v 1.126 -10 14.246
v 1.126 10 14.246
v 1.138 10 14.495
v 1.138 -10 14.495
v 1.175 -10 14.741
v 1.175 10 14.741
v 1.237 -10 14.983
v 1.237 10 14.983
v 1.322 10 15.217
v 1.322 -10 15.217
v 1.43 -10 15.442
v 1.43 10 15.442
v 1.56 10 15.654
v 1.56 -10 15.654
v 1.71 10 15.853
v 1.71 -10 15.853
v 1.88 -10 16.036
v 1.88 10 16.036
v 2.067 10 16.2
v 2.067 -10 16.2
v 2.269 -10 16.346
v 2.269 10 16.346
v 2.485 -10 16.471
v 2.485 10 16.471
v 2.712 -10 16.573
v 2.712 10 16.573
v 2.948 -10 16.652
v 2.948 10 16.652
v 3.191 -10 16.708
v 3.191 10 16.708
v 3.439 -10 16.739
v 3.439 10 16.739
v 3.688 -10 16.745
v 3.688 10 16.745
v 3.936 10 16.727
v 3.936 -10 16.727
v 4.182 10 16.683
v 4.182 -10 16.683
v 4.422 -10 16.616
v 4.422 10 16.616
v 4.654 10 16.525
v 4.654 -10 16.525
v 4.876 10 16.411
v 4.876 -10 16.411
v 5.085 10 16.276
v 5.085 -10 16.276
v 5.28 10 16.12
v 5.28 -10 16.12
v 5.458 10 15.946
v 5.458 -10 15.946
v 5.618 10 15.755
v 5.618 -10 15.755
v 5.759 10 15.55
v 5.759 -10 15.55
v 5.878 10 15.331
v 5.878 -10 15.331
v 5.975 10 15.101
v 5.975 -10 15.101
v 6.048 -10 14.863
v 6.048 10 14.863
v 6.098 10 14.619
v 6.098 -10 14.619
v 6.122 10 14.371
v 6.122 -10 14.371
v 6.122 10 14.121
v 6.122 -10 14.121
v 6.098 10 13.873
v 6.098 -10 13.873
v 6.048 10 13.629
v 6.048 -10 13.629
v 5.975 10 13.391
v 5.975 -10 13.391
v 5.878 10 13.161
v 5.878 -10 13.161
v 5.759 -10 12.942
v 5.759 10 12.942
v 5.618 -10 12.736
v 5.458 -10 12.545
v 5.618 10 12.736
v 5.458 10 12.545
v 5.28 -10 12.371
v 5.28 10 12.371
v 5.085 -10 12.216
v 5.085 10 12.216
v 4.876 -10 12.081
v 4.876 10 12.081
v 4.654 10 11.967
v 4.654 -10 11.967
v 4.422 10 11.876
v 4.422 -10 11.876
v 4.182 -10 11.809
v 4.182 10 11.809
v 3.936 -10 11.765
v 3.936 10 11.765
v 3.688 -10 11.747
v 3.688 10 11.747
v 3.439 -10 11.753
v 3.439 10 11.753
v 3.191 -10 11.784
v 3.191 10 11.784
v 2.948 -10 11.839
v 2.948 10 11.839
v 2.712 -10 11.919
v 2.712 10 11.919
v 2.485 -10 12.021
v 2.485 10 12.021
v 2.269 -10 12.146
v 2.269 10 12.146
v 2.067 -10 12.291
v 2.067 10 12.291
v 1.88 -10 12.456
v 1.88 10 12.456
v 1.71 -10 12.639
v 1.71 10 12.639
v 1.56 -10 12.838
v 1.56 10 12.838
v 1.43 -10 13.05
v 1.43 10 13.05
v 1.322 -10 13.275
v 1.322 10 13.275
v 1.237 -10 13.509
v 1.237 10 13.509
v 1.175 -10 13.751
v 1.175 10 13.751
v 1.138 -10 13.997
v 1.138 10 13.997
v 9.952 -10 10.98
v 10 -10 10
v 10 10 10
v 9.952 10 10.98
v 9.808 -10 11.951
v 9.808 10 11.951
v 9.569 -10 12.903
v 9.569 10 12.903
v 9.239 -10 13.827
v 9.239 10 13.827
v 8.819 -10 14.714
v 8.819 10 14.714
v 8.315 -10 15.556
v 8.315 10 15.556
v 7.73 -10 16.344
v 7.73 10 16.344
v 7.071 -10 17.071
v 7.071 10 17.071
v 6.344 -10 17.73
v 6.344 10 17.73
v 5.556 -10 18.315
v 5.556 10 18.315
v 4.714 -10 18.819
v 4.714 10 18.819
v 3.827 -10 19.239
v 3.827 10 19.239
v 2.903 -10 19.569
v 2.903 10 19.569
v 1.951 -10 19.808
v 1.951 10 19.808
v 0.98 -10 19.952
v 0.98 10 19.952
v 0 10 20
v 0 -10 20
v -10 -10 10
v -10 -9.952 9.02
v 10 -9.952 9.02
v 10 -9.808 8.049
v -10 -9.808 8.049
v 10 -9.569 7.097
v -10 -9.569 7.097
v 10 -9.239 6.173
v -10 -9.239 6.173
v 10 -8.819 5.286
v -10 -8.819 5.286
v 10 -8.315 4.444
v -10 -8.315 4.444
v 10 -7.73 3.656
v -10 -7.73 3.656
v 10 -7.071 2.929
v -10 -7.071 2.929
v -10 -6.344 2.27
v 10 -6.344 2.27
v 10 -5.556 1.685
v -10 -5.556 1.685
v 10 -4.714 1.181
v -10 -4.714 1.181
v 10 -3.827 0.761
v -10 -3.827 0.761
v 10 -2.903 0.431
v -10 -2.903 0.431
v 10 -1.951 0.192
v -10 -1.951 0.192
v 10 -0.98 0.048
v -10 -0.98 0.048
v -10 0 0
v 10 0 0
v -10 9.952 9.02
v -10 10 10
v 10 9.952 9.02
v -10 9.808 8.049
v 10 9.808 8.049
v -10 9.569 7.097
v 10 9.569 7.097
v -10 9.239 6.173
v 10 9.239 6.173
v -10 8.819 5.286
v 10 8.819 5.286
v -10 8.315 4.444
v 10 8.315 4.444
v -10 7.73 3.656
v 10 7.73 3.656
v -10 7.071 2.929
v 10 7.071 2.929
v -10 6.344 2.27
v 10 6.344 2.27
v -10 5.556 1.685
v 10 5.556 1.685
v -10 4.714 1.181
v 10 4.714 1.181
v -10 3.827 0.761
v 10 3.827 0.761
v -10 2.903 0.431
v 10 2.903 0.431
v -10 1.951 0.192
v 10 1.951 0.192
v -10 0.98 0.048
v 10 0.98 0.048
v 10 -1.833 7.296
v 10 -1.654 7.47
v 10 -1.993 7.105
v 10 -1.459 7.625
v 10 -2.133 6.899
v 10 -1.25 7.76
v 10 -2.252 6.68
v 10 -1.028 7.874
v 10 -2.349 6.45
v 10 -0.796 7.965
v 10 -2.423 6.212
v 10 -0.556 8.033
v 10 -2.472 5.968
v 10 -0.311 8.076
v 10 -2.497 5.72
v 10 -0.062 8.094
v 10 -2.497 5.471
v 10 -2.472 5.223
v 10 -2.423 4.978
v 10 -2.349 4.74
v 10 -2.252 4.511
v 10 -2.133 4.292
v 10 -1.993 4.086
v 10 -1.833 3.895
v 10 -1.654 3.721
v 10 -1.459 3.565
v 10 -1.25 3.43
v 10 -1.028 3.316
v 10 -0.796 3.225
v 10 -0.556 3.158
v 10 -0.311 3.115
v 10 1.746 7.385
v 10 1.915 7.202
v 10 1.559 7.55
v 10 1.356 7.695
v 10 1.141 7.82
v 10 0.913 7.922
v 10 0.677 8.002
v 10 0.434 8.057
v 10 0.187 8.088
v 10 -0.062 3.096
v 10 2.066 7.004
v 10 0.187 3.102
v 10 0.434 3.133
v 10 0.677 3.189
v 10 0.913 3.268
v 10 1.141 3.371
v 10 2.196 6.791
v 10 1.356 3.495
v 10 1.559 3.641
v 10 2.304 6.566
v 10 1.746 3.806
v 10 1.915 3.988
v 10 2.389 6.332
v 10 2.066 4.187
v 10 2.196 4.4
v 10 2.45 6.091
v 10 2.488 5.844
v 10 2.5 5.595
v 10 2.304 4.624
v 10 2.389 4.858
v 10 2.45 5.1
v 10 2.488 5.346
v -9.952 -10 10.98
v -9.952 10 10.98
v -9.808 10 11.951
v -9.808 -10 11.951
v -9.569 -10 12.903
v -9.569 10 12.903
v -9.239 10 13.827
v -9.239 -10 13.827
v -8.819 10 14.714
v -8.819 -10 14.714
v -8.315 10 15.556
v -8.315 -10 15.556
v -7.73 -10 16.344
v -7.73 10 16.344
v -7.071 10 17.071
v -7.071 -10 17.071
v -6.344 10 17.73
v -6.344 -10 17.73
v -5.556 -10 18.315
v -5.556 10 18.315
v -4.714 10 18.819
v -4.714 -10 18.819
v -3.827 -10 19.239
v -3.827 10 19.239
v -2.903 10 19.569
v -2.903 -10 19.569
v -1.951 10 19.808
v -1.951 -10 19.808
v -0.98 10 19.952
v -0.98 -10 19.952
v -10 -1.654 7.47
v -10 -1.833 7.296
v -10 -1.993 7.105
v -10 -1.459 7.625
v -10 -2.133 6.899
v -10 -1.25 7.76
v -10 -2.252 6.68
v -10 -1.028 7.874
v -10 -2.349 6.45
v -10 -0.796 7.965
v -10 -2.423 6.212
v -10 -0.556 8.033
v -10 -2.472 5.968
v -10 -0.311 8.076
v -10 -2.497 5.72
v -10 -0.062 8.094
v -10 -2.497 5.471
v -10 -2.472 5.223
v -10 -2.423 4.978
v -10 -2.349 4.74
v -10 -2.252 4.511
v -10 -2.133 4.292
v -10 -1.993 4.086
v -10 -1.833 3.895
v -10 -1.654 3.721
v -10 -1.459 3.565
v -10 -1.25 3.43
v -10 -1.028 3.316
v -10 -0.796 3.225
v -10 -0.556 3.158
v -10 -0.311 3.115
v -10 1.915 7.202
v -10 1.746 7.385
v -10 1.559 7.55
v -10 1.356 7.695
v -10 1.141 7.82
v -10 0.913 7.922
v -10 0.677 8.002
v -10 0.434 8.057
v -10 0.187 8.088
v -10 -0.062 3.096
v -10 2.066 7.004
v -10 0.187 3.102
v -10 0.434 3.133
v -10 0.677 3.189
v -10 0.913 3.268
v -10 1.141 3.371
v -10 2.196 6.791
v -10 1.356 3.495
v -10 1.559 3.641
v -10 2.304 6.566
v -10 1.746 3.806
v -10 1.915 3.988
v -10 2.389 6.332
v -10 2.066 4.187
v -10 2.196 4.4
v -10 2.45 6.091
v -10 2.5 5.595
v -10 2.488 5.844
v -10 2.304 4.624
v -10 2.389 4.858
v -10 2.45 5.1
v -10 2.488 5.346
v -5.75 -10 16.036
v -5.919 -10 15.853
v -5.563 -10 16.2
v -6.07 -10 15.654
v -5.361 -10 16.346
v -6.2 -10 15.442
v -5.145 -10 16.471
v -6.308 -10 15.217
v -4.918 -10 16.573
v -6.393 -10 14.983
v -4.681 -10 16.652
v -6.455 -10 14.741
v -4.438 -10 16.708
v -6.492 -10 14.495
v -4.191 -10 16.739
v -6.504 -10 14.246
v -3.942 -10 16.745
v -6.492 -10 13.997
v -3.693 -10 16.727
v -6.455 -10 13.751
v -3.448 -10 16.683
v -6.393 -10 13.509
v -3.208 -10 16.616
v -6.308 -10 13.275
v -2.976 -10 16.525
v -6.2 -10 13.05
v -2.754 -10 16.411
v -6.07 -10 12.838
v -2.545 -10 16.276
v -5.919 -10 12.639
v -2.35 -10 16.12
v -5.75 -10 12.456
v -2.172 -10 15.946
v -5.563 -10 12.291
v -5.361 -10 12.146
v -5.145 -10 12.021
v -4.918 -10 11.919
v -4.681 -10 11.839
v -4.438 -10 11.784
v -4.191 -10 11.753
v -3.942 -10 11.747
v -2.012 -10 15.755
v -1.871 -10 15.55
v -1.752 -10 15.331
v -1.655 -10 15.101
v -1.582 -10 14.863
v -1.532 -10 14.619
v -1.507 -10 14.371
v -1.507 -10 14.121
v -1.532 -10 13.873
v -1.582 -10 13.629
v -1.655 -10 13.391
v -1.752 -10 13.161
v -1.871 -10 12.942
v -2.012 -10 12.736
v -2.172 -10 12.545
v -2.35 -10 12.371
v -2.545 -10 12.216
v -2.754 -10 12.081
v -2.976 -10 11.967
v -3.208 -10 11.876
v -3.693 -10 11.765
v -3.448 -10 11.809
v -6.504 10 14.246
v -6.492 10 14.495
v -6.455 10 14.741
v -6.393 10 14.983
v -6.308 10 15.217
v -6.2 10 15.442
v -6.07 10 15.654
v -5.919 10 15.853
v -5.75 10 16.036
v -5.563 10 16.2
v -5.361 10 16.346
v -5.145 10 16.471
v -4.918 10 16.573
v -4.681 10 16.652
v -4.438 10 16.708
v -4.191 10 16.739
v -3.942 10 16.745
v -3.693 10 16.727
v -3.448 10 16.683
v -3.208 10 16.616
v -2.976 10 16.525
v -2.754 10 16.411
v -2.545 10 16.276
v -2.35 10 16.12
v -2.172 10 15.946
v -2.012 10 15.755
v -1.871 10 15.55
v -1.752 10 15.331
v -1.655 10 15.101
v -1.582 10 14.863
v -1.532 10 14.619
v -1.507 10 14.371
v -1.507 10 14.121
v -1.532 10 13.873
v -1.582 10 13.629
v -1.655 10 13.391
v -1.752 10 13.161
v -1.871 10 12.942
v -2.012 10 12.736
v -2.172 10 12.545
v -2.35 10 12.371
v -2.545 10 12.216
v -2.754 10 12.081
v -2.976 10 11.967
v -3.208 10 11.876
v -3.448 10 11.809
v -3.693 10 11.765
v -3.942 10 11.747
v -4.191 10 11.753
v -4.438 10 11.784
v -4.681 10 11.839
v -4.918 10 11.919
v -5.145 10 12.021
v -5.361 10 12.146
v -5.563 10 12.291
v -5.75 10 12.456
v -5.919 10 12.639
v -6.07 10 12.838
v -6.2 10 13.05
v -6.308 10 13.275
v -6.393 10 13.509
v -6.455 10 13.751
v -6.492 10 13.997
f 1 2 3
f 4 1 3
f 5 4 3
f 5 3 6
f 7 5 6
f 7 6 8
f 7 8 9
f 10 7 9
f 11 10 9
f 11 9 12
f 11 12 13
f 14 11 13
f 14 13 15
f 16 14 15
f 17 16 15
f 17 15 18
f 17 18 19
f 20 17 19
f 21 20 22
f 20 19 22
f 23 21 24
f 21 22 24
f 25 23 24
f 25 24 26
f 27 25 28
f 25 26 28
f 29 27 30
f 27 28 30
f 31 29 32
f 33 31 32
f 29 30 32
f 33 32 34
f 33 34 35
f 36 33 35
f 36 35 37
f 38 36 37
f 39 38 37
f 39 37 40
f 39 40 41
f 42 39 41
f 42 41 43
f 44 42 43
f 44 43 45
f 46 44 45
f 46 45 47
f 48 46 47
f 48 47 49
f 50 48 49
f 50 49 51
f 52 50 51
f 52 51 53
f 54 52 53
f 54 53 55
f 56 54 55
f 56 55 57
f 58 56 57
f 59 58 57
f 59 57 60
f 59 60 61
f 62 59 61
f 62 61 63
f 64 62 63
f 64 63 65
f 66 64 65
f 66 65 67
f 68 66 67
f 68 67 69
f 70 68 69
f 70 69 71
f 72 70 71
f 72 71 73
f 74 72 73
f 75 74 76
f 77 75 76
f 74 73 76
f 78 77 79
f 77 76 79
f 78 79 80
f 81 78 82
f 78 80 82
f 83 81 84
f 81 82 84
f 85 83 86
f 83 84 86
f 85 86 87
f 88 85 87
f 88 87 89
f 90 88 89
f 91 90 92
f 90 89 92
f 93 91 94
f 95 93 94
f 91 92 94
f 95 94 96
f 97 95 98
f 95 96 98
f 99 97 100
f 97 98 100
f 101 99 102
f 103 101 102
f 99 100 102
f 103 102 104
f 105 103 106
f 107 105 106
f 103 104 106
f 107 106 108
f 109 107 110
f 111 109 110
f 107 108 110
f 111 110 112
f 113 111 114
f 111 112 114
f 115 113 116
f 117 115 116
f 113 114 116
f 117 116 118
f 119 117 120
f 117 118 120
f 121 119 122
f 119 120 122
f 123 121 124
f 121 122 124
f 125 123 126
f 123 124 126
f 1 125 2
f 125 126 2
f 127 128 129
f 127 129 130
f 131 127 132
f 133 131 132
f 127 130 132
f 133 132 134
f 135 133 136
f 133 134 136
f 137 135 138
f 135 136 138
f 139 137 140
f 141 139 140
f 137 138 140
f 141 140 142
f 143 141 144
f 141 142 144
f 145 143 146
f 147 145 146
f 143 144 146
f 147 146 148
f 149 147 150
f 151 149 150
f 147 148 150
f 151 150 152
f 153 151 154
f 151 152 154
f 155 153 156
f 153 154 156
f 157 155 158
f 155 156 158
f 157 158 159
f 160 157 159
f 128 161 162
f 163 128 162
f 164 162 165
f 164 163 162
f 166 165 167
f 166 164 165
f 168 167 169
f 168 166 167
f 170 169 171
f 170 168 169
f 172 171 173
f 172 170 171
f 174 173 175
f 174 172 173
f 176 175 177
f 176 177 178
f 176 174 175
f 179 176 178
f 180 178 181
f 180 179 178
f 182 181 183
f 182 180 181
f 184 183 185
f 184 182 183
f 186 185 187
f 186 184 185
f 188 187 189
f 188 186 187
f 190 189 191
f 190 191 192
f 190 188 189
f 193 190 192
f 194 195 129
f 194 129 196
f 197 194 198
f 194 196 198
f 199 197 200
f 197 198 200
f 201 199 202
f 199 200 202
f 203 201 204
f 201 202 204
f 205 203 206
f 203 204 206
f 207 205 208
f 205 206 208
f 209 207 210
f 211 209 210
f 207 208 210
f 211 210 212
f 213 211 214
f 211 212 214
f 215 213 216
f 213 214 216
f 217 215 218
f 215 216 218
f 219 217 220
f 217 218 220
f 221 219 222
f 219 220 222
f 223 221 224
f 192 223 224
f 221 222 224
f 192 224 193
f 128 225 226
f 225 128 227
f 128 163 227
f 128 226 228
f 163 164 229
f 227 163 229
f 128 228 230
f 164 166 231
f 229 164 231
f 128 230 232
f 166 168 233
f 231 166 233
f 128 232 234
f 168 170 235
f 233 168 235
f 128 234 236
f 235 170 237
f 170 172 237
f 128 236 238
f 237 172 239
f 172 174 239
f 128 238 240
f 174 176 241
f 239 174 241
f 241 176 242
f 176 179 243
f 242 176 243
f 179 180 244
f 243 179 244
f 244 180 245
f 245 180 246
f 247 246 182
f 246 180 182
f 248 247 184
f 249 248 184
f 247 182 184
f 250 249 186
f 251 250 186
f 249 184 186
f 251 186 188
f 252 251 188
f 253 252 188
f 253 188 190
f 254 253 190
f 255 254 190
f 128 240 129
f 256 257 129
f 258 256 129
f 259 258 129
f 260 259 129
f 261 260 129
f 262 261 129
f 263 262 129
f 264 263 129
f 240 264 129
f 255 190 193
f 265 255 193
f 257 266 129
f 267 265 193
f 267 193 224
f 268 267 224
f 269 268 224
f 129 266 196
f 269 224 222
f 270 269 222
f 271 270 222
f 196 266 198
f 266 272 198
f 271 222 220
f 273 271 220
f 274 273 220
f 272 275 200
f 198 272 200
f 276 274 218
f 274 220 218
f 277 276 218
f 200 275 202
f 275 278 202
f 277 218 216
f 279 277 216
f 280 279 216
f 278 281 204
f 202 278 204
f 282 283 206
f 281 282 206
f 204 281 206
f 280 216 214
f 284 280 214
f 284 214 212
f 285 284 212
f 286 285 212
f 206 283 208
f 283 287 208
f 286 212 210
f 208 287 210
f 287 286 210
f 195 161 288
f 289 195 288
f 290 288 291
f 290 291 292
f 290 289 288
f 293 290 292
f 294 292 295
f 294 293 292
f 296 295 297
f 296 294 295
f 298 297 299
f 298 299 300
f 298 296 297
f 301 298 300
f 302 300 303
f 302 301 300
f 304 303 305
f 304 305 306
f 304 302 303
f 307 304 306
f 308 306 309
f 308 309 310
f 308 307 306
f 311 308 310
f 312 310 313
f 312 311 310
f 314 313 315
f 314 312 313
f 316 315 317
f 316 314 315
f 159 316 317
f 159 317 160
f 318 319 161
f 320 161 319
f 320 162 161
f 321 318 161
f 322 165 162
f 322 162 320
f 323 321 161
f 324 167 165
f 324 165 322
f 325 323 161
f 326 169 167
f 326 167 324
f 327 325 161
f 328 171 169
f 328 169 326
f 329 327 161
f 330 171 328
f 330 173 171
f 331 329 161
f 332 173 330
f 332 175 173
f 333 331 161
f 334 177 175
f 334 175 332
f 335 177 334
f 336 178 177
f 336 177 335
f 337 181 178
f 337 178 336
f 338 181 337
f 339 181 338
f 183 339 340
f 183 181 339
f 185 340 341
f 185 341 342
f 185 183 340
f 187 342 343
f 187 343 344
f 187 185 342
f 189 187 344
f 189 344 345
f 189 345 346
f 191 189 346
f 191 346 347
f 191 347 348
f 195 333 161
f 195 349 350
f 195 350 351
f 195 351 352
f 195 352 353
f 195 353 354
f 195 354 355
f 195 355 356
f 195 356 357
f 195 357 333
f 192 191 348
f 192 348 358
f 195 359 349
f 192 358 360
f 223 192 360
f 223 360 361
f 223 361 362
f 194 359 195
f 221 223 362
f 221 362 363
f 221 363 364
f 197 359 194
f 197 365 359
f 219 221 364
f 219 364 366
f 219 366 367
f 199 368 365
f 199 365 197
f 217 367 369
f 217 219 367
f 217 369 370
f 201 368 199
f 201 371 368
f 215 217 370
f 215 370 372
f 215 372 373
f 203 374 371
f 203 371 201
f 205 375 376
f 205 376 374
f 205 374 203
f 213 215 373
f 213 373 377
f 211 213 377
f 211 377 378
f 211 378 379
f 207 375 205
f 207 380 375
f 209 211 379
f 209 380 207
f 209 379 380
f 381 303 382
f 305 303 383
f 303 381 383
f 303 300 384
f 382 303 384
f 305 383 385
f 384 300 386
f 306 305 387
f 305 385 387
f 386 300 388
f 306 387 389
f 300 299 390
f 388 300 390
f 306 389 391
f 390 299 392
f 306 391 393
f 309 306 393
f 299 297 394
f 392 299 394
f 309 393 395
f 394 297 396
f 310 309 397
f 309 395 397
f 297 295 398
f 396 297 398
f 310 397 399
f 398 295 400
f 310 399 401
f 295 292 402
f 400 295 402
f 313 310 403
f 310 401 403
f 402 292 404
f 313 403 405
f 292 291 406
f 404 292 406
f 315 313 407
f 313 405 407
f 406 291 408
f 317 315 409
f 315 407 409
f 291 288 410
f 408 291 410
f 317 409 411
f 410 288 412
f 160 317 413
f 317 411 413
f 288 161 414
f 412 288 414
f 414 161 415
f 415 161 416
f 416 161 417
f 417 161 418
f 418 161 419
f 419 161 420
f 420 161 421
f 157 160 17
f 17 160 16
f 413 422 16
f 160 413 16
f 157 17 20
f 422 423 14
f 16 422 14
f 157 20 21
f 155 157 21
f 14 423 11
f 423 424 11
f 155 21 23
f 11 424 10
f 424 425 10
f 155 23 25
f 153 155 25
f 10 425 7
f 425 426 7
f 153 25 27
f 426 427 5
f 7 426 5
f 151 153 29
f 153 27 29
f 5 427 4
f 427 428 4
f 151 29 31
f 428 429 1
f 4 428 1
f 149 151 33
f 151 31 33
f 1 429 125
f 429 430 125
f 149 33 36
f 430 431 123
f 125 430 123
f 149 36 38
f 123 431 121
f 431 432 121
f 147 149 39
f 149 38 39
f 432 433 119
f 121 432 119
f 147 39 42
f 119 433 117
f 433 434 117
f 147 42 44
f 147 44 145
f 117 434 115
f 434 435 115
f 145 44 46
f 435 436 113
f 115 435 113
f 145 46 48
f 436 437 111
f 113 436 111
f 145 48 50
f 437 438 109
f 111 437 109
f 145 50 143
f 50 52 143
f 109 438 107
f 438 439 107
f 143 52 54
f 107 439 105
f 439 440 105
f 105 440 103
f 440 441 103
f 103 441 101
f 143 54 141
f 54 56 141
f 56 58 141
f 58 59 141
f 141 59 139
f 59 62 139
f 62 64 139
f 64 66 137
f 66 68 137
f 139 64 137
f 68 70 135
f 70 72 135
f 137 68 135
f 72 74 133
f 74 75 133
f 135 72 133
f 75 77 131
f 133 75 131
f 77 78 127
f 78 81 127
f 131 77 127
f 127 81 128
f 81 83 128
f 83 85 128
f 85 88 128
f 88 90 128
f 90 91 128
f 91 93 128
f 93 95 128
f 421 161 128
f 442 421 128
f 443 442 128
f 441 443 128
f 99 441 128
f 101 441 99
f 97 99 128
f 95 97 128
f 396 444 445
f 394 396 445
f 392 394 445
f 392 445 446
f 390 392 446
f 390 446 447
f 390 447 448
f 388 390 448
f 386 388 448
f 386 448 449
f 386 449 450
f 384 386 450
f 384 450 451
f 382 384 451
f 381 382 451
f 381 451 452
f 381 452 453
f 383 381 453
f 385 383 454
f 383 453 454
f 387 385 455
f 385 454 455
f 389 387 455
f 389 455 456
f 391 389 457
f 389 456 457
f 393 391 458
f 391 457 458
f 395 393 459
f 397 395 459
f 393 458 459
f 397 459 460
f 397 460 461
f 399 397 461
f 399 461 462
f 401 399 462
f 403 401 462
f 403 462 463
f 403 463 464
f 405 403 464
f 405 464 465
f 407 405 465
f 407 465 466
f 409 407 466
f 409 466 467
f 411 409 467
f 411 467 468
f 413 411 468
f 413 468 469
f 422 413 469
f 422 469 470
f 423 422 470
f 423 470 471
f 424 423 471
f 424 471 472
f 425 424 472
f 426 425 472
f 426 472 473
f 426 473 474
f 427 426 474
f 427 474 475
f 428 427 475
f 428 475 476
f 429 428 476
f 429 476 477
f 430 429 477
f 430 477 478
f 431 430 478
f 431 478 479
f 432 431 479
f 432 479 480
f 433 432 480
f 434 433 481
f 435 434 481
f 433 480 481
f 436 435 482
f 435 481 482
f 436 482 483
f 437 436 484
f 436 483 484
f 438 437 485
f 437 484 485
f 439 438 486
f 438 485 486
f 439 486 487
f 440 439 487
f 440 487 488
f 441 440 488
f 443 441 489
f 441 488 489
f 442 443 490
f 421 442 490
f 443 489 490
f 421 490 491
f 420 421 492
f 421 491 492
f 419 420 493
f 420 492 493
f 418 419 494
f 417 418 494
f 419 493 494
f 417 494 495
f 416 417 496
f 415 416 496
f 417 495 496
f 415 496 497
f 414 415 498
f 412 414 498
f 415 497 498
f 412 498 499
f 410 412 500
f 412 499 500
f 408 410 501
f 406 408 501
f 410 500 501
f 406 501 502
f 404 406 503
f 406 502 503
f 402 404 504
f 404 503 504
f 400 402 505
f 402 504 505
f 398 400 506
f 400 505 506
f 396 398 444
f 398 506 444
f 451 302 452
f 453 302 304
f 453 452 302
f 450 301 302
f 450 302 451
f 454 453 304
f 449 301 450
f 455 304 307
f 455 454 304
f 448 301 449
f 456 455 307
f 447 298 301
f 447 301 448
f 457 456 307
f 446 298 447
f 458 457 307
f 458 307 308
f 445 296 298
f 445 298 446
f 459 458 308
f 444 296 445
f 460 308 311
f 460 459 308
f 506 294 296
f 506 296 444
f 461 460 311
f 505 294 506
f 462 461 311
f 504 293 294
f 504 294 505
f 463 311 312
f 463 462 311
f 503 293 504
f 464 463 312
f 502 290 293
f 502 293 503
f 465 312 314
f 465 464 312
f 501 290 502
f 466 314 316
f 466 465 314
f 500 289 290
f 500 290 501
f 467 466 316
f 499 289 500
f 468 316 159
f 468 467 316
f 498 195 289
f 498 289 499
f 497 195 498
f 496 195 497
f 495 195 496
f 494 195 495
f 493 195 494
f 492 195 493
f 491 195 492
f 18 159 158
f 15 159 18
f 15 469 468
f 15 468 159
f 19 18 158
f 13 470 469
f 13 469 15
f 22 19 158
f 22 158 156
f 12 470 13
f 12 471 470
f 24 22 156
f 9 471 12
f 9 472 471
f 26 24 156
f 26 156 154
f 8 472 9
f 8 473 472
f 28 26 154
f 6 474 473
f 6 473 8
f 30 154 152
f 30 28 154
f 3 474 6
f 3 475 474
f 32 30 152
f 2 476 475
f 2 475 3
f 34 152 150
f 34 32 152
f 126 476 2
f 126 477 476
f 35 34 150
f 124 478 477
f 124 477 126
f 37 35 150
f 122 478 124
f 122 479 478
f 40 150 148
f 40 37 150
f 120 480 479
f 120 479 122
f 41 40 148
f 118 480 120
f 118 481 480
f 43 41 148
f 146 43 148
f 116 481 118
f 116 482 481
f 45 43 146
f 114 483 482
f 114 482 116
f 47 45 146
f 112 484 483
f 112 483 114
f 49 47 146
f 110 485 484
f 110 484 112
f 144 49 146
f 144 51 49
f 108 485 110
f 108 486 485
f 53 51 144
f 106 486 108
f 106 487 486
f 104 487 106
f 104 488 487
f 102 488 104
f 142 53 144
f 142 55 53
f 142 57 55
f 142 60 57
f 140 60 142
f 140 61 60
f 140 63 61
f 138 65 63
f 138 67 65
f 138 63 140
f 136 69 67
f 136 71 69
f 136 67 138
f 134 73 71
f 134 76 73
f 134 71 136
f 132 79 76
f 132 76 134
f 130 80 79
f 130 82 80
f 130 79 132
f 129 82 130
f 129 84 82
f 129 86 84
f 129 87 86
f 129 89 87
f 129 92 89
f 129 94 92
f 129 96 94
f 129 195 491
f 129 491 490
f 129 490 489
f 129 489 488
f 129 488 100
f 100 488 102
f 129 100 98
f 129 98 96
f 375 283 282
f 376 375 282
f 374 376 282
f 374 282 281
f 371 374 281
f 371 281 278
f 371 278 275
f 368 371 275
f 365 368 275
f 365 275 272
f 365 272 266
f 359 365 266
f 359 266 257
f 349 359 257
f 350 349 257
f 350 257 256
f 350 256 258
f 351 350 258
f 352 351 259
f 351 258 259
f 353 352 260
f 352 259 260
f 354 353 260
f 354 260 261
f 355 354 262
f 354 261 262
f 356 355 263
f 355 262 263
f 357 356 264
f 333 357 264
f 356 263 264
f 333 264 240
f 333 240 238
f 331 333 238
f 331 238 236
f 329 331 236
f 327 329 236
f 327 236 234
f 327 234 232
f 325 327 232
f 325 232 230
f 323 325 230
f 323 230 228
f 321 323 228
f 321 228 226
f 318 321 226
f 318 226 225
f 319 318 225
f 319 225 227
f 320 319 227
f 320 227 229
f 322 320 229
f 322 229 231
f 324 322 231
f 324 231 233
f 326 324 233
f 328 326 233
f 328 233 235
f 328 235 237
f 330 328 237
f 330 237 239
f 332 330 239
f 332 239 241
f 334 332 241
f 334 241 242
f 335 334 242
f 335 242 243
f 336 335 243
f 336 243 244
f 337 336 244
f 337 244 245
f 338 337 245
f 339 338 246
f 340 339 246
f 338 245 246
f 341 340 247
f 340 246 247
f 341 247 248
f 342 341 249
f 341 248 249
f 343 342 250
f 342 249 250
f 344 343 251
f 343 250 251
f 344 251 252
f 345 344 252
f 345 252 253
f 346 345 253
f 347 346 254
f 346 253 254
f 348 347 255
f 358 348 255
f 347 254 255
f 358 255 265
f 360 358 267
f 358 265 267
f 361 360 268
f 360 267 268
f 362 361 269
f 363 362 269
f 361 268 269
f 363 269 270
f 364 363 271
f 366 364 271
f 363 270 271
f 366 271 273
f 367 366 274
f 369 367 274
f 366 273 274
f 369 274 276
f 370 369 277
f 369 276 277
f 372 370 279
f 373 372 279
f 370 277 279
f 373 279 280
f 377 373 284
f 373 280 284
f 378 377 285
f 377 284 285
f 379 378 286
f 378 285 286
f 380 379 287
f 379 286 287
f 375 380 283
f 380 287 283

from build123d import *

# Parameters (mm, degrees)
F0_W     = 20
F0_H     = 20
F1_DEPTH = 20
F2_R     = 9.99999
F5_D     = 5
F6_D     = 5


# Not quite as in the source:
# - a fillet or chamfer is up to 0.001 mm smaller than in the source, because OpenCascade refuses the exact size


with BuildPart() as f1:
    # F0 (on Top) → F1 (new body)
    with BuildSketch(Plane.XY):
        Rectangle(F0_W, F0_H)
    extrude(amount=F1_DEPTH)

    # F2 (radius 10 in the source; OpenCascade refuses exactly that, so slightly less here)
    f2_edges = [f1.edges().sort_by_distance(p)[0] for p in [
        (10, 0, 20),
        (-10, 0, 20),
        (0, -10, 0),
        (0, 10, 0),
    ]]
    fillet(f2_edges, radius=F2_R)

    # F5 (through all)
    with Locations(Plane(origin=(-10, 0, 0), x_dir=(0, -1, 0), z_dir=(-1, 0, 0))):
        with Locations((0, 5.5952616967)):
            Hole(F5_D / 2)

    # F6 (through all)
    with Locations(Plane.XZ.offset(10)):
        with Locations((-4.0043536574, 14.245916158), (3.62556451, 14.245916158)):
            Hole(F6_D / 2)


solid = f1.part
